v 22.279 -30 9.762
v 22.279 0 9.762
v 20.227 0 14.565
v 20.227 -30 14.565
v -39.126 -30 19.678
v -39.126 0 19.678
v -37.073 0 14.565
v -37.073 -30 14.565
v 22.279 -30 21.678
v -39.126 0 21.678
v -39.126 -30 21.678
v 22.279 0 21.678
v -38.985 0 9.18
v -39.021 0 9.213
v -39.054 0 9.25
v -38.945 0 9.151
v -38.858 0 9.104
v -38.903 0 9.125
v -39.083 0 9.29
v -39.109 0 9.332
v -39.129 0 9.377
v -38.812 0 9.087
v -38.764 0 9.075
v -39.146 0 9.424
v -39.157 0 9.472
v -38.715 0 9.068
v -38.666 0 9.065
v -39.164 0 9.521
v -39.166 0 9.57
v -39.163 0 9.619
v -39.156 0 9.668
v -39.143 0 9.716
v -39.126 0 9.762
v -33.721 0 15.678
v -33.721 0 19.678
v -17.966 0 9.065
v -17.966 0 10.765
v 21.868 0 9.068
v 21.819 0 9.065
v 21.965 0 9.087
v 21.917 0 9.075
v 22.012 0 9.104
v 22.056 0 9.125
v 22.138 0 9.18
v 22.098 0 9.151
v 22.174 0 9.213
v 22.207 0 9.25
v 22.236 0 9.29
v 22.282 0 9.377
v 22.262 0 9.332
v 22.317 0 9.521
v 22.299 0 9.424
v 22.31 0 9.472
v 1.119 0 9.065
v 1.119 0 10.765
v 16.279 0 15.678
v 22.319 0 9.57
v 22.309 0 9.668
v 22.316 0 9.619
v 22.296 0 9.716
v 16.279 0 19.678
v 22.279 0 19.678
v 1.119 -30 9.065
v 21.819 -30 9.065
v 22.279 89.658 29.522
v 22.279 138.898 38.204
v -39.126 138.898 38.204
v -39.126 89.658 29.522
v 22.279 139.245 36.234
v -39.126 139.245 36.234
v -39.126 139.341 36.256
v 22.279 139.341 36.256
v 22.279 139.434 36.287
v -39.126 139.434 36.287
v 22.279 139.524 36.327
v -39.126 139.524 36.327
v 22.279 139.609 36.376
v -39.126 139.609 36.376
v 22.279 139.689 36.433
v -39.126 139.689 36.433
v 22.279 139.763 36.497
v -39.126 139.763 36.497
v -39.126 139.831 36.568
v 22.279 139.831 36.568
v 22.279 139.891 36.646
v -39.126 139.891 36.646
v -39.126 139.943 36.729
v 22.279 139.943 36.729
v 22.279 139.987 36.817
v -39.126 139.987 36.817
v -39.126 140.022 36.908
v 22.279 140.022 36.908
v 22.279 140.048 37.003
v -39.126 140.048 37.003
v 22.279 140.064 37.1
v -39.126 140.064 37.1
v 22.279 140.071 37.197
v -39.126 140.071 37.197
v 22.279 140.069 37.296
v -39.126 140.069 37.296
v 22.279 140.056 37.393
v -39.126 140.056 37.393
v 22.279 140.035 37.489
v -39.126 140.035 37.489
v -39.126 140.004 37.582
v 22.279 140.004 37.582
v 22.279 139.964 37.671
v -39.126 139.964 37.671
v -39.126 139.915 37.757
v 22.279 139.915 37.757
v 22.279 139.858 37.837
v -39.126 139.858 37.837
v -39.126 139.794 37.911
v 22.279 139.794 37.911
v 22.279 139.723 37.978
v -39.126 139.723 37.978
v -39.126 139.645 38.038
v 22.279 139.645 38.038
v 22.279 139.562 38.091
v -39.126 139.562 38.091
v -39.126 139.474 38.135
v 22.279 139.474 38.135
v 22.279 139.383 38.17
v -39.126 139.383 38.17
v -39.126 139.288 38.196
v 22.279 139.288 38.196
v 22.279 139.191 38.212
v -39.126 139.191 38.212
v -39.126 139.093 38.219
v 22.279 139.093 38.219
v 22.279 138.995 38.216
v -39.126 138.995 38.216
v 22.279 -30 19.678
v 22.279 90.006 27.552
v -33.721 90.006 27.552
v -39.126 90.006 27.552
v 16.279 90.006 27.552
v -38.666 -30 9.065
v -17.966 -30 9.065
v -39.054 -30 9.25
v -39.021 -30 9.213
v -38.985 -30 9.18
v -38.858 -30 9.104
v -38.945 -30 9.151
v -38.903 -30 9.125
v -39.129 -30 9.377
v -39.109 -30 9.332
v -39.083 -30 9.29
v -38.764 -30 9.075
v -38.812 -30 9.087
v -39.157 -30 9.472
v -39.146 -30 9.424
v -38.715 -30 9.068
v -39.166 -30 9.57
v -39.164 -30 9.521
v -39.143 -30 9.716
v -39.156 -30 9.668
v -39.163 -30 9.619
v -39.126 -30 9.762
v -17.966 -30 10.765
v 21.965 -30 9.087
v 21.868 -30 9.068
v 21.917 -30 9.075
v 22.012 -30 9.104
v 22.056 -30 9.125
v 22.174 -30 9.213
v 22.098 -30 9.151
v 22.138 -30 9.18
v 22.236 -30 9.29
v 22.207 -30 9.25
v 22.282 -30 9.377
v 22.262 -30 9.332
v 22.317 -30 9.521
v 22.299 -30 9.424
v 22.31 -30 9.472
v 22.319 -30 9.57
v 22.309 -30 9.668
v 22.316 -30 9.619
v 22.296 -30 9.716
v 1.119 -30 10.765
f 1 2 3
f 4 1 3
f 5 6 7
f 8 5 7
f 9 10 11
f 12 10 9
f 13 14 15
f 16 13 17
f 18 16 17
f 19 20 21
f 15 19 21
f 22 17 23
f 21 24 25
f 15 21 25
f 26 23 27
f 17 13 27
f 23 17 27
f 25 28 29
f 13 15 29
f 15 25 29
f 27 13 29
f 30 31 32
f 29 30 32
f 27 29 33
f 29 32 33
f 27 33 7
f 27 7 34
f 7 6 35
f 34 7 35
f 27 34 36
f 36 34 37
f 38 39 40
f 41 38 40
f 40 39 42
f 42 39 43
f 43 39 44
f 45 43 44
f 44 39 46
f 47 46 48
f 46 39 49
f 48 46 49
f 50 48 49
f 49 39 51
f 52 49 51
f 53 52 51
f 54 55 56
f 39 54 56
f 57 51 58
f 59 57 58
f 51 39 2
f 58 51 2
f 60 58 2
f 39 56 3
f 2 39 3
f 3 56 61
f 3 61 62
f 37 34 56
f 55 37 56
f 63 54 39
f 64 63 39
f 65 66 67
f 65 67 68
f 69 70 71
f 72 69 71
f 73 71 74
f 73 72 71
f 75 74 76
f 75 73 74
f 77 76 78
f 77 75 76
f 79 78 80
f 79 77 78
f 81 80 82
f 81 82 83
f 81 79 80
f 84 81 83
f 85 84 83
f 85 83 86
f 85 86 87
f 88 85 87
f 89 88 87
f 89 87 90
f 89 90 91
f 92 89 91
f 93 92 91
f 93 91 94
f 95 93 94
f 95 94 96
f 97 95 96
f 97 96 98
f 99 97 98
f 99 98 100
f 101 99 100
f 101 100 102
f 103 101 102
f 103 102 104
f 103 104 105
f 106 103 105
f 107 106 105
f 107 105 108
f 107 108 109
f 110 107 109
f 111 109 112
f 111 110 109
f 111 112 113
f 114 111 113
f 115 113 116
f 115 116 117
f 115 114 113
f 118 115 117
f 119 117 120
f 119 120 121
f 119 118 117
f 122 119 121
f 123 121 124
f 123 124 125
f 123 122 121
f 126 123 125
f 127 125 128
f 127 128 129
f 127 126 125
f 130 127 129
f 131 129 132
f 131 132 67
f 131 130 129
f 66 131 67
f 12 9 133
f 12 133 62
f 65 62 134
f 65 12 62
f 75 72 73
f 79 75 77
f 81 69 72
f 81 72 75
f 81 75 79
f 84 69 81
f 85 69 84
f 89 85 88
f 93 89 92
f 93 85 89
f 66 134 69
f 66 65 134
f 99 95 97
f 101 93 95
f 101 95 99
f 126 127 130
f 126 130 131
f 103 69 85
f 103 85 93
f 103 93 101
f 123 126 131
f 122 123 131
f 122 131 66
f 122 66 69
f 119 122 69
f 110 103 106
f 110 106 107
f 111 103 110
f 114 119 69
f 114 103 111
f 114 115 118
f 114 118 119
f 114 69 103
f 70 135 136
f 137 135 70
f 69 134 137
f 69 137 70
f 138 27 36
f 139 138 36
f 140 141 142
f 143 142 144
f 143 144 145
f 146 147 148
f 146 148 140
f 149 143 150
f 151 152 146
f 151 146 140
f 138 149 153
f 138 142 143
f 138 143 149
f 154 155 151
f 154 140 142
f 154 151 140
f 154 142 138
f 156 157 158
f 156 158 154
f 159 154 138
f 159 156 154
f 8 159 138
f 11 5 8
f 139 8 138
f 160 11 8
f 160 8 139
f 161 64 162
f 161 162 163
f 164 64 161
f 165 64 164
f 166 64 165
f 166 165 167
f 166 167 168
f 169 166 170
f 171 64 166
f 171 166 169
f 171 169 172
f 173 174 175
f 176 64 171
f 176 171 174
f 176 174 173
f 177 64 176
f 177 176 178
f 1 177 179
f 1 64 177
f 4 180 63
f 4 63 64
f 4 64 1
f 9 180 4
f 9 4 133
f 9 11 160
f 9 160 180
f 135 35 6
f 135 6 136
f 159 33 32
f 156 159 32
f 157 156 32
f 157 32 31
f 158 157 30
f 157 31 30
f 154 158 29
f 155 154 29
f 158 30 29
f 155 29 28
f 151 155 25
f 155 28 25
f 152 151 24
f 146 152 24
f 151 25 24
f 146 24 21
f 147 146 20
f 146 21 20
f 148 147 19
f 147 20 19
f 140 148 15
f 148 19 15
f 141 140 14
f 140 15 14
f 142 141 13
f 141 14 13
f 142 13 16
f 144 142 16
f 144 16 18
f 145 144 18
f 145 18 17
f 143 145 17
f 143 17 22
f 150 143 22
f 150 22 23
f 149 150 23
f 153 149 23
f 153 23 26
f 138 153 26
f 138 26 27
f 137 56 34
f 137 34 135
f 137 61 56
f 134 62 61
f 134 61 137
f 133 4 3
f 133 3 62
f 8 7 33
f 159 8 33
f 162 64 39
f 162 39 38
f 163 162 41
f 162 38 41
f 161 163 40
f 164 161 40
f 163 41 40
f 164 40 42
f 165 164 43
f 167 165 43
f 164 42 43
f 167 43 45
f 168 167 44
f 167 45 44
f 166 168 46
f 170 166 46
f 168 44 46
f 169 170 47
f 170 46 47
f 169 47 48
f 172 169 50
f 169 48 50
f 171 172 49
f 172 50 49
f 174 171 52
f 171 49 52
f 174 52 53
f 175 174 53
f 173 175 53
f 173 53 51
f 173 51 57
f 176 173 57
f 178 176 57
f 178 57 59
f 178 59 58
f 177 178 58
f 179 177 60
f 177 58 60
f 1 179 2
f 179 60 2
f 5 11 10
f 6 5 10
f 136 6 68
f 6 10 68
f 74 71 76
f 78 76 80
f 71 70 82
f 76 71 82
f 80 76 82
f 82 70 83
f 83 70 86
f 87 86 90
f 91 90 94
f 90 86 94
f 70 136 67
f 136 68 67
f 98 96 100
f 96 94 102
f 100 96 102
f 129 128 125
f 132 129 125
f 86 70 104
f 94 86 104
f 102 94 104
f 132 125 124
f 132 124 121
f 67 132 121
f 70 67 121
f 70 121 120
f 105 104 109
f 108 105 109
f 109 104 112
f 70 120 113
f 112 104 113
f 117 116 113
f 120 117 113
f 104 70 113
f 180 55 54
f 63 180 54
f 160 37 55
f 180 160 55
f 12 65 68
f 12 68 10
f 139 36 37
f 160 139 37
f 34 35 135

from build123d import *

# Parameters (mm, degrees)
F0_W          = 61.4048474937
F0_H          = 2
F1_DEPTH      = 30
F4_DEPTH      = 31
F4_DEPTH_BACK = 30.4048474937
F5_DEPTH      = 25


with BuildPart() as f1:
    # F0 (on Front) → F1 (new body)
    with BuildSketch(Plane.XZ):
        with BuildLine():
            Line((-37.0734768147, 14.5654241689), (-39.1259005615, 9.7618792294))
            ThreePointArc((-39.1259005615, 9.7618792294), (-39.0833815375, 9.2899496059), (-38.6661121219, 9.0654241689))
            Line((-38.6661121219, 9.0654241689), (-17.9661121219, 9.0654241689))
            Line((-17.9661121219, 9.0654241689), (-17.9661121219, 10.7654241689))
            Line((-17.9661121219, 10.7654241689), (1.1191584926, 10.7654241689))
            Line((1.1191584926, 10.7654241689), (1.1191584926, 9.0654241689))
            Line((1.1191584926, 9.0654241689), (21.8191584926, 9.0654241689))
            ThreePointArc((21.8191584926, 9.0654241689), (22.2364279081, 9.2899496059), (22.2789469322, 9.7618792294))
            Line((22.2789469322, 9.7618792294), (20.2265231853, 14.5654241689))
            Line((20.2265231853, 14.5654241689), (22.2789469322, 19.6776874363))
            Line((22.2789469322, 19.6776874363), (-39.1259005615, 19.6776874363))
            Line((-39.1259005615, 19.6776874363), (-37.0734768147, 14.5654241689))
        make_face()
        with Locations((-8.4234768147, 20.6776874363)):
            Rectangle(F0_W, F0_H)
    extrude(amount=F1_DEPTH)

    # F3 (on offset) → F4 (join, two sides)
    with BuildSketch(Plane.YZ.offset(-8.7210530678)) as f4_sk:
        with BuildLine():
            Line((138.8979104789, 38.204113167), (89.6575228283, 29.5217042836))
            Line((89.6575228283, 29.5217042836), (0, 21.6776874363))
            Line((0, 21.6776874363), (0, 19.6776874363))
            Line((0, 19.6776874363), (90.0055822498, 27.5522234792))
            Line((90.0055822498, 27.5522234792), (139.2452068342, 36.234497661))
            ThreePointArc((139.2452068342, 36.234497661), (140.0563664095, 37.3929535916), (138.8979104789, 38.204113167))
        make_face()
    extrude(amount=F4_DEPTH)
    extrude(f4_sk.sketch, amount=-F4_DEPTH_BACK)

    # F3 (on offset) → F5 (join, symmetric)
    with BuildSketch(Plane.YZ.offset(-8.7210530678)):
        with BuildLine():
            Line((138.8979104789, 38.204113167), (89.6575228283, 29.5217042836))
            Line((89.6575228283, 29.5217042836), (0, 21.6776874363))
            Line((0, 21.6776874363), (0, 19.6776874363))
            Line((0, 19.6776874363), (90.0055822498, 27.5522234792))
            Line((90.0055822498, 27.5522234792), (139.2452068342, 36.234497661))
            ThreePointArc((139.2452068342, 36.234497661), (140.0563664095, 37.3929535916), (138.8979104789, 38.204113167))
        make_face()
        Polygon((90.0055822498, 27.5522234792), (0, 19.6776874363), (0, 15.6776874363), align=None)
    extrude(amount=F5_DEPTH, both=True)


solid = f1.part
